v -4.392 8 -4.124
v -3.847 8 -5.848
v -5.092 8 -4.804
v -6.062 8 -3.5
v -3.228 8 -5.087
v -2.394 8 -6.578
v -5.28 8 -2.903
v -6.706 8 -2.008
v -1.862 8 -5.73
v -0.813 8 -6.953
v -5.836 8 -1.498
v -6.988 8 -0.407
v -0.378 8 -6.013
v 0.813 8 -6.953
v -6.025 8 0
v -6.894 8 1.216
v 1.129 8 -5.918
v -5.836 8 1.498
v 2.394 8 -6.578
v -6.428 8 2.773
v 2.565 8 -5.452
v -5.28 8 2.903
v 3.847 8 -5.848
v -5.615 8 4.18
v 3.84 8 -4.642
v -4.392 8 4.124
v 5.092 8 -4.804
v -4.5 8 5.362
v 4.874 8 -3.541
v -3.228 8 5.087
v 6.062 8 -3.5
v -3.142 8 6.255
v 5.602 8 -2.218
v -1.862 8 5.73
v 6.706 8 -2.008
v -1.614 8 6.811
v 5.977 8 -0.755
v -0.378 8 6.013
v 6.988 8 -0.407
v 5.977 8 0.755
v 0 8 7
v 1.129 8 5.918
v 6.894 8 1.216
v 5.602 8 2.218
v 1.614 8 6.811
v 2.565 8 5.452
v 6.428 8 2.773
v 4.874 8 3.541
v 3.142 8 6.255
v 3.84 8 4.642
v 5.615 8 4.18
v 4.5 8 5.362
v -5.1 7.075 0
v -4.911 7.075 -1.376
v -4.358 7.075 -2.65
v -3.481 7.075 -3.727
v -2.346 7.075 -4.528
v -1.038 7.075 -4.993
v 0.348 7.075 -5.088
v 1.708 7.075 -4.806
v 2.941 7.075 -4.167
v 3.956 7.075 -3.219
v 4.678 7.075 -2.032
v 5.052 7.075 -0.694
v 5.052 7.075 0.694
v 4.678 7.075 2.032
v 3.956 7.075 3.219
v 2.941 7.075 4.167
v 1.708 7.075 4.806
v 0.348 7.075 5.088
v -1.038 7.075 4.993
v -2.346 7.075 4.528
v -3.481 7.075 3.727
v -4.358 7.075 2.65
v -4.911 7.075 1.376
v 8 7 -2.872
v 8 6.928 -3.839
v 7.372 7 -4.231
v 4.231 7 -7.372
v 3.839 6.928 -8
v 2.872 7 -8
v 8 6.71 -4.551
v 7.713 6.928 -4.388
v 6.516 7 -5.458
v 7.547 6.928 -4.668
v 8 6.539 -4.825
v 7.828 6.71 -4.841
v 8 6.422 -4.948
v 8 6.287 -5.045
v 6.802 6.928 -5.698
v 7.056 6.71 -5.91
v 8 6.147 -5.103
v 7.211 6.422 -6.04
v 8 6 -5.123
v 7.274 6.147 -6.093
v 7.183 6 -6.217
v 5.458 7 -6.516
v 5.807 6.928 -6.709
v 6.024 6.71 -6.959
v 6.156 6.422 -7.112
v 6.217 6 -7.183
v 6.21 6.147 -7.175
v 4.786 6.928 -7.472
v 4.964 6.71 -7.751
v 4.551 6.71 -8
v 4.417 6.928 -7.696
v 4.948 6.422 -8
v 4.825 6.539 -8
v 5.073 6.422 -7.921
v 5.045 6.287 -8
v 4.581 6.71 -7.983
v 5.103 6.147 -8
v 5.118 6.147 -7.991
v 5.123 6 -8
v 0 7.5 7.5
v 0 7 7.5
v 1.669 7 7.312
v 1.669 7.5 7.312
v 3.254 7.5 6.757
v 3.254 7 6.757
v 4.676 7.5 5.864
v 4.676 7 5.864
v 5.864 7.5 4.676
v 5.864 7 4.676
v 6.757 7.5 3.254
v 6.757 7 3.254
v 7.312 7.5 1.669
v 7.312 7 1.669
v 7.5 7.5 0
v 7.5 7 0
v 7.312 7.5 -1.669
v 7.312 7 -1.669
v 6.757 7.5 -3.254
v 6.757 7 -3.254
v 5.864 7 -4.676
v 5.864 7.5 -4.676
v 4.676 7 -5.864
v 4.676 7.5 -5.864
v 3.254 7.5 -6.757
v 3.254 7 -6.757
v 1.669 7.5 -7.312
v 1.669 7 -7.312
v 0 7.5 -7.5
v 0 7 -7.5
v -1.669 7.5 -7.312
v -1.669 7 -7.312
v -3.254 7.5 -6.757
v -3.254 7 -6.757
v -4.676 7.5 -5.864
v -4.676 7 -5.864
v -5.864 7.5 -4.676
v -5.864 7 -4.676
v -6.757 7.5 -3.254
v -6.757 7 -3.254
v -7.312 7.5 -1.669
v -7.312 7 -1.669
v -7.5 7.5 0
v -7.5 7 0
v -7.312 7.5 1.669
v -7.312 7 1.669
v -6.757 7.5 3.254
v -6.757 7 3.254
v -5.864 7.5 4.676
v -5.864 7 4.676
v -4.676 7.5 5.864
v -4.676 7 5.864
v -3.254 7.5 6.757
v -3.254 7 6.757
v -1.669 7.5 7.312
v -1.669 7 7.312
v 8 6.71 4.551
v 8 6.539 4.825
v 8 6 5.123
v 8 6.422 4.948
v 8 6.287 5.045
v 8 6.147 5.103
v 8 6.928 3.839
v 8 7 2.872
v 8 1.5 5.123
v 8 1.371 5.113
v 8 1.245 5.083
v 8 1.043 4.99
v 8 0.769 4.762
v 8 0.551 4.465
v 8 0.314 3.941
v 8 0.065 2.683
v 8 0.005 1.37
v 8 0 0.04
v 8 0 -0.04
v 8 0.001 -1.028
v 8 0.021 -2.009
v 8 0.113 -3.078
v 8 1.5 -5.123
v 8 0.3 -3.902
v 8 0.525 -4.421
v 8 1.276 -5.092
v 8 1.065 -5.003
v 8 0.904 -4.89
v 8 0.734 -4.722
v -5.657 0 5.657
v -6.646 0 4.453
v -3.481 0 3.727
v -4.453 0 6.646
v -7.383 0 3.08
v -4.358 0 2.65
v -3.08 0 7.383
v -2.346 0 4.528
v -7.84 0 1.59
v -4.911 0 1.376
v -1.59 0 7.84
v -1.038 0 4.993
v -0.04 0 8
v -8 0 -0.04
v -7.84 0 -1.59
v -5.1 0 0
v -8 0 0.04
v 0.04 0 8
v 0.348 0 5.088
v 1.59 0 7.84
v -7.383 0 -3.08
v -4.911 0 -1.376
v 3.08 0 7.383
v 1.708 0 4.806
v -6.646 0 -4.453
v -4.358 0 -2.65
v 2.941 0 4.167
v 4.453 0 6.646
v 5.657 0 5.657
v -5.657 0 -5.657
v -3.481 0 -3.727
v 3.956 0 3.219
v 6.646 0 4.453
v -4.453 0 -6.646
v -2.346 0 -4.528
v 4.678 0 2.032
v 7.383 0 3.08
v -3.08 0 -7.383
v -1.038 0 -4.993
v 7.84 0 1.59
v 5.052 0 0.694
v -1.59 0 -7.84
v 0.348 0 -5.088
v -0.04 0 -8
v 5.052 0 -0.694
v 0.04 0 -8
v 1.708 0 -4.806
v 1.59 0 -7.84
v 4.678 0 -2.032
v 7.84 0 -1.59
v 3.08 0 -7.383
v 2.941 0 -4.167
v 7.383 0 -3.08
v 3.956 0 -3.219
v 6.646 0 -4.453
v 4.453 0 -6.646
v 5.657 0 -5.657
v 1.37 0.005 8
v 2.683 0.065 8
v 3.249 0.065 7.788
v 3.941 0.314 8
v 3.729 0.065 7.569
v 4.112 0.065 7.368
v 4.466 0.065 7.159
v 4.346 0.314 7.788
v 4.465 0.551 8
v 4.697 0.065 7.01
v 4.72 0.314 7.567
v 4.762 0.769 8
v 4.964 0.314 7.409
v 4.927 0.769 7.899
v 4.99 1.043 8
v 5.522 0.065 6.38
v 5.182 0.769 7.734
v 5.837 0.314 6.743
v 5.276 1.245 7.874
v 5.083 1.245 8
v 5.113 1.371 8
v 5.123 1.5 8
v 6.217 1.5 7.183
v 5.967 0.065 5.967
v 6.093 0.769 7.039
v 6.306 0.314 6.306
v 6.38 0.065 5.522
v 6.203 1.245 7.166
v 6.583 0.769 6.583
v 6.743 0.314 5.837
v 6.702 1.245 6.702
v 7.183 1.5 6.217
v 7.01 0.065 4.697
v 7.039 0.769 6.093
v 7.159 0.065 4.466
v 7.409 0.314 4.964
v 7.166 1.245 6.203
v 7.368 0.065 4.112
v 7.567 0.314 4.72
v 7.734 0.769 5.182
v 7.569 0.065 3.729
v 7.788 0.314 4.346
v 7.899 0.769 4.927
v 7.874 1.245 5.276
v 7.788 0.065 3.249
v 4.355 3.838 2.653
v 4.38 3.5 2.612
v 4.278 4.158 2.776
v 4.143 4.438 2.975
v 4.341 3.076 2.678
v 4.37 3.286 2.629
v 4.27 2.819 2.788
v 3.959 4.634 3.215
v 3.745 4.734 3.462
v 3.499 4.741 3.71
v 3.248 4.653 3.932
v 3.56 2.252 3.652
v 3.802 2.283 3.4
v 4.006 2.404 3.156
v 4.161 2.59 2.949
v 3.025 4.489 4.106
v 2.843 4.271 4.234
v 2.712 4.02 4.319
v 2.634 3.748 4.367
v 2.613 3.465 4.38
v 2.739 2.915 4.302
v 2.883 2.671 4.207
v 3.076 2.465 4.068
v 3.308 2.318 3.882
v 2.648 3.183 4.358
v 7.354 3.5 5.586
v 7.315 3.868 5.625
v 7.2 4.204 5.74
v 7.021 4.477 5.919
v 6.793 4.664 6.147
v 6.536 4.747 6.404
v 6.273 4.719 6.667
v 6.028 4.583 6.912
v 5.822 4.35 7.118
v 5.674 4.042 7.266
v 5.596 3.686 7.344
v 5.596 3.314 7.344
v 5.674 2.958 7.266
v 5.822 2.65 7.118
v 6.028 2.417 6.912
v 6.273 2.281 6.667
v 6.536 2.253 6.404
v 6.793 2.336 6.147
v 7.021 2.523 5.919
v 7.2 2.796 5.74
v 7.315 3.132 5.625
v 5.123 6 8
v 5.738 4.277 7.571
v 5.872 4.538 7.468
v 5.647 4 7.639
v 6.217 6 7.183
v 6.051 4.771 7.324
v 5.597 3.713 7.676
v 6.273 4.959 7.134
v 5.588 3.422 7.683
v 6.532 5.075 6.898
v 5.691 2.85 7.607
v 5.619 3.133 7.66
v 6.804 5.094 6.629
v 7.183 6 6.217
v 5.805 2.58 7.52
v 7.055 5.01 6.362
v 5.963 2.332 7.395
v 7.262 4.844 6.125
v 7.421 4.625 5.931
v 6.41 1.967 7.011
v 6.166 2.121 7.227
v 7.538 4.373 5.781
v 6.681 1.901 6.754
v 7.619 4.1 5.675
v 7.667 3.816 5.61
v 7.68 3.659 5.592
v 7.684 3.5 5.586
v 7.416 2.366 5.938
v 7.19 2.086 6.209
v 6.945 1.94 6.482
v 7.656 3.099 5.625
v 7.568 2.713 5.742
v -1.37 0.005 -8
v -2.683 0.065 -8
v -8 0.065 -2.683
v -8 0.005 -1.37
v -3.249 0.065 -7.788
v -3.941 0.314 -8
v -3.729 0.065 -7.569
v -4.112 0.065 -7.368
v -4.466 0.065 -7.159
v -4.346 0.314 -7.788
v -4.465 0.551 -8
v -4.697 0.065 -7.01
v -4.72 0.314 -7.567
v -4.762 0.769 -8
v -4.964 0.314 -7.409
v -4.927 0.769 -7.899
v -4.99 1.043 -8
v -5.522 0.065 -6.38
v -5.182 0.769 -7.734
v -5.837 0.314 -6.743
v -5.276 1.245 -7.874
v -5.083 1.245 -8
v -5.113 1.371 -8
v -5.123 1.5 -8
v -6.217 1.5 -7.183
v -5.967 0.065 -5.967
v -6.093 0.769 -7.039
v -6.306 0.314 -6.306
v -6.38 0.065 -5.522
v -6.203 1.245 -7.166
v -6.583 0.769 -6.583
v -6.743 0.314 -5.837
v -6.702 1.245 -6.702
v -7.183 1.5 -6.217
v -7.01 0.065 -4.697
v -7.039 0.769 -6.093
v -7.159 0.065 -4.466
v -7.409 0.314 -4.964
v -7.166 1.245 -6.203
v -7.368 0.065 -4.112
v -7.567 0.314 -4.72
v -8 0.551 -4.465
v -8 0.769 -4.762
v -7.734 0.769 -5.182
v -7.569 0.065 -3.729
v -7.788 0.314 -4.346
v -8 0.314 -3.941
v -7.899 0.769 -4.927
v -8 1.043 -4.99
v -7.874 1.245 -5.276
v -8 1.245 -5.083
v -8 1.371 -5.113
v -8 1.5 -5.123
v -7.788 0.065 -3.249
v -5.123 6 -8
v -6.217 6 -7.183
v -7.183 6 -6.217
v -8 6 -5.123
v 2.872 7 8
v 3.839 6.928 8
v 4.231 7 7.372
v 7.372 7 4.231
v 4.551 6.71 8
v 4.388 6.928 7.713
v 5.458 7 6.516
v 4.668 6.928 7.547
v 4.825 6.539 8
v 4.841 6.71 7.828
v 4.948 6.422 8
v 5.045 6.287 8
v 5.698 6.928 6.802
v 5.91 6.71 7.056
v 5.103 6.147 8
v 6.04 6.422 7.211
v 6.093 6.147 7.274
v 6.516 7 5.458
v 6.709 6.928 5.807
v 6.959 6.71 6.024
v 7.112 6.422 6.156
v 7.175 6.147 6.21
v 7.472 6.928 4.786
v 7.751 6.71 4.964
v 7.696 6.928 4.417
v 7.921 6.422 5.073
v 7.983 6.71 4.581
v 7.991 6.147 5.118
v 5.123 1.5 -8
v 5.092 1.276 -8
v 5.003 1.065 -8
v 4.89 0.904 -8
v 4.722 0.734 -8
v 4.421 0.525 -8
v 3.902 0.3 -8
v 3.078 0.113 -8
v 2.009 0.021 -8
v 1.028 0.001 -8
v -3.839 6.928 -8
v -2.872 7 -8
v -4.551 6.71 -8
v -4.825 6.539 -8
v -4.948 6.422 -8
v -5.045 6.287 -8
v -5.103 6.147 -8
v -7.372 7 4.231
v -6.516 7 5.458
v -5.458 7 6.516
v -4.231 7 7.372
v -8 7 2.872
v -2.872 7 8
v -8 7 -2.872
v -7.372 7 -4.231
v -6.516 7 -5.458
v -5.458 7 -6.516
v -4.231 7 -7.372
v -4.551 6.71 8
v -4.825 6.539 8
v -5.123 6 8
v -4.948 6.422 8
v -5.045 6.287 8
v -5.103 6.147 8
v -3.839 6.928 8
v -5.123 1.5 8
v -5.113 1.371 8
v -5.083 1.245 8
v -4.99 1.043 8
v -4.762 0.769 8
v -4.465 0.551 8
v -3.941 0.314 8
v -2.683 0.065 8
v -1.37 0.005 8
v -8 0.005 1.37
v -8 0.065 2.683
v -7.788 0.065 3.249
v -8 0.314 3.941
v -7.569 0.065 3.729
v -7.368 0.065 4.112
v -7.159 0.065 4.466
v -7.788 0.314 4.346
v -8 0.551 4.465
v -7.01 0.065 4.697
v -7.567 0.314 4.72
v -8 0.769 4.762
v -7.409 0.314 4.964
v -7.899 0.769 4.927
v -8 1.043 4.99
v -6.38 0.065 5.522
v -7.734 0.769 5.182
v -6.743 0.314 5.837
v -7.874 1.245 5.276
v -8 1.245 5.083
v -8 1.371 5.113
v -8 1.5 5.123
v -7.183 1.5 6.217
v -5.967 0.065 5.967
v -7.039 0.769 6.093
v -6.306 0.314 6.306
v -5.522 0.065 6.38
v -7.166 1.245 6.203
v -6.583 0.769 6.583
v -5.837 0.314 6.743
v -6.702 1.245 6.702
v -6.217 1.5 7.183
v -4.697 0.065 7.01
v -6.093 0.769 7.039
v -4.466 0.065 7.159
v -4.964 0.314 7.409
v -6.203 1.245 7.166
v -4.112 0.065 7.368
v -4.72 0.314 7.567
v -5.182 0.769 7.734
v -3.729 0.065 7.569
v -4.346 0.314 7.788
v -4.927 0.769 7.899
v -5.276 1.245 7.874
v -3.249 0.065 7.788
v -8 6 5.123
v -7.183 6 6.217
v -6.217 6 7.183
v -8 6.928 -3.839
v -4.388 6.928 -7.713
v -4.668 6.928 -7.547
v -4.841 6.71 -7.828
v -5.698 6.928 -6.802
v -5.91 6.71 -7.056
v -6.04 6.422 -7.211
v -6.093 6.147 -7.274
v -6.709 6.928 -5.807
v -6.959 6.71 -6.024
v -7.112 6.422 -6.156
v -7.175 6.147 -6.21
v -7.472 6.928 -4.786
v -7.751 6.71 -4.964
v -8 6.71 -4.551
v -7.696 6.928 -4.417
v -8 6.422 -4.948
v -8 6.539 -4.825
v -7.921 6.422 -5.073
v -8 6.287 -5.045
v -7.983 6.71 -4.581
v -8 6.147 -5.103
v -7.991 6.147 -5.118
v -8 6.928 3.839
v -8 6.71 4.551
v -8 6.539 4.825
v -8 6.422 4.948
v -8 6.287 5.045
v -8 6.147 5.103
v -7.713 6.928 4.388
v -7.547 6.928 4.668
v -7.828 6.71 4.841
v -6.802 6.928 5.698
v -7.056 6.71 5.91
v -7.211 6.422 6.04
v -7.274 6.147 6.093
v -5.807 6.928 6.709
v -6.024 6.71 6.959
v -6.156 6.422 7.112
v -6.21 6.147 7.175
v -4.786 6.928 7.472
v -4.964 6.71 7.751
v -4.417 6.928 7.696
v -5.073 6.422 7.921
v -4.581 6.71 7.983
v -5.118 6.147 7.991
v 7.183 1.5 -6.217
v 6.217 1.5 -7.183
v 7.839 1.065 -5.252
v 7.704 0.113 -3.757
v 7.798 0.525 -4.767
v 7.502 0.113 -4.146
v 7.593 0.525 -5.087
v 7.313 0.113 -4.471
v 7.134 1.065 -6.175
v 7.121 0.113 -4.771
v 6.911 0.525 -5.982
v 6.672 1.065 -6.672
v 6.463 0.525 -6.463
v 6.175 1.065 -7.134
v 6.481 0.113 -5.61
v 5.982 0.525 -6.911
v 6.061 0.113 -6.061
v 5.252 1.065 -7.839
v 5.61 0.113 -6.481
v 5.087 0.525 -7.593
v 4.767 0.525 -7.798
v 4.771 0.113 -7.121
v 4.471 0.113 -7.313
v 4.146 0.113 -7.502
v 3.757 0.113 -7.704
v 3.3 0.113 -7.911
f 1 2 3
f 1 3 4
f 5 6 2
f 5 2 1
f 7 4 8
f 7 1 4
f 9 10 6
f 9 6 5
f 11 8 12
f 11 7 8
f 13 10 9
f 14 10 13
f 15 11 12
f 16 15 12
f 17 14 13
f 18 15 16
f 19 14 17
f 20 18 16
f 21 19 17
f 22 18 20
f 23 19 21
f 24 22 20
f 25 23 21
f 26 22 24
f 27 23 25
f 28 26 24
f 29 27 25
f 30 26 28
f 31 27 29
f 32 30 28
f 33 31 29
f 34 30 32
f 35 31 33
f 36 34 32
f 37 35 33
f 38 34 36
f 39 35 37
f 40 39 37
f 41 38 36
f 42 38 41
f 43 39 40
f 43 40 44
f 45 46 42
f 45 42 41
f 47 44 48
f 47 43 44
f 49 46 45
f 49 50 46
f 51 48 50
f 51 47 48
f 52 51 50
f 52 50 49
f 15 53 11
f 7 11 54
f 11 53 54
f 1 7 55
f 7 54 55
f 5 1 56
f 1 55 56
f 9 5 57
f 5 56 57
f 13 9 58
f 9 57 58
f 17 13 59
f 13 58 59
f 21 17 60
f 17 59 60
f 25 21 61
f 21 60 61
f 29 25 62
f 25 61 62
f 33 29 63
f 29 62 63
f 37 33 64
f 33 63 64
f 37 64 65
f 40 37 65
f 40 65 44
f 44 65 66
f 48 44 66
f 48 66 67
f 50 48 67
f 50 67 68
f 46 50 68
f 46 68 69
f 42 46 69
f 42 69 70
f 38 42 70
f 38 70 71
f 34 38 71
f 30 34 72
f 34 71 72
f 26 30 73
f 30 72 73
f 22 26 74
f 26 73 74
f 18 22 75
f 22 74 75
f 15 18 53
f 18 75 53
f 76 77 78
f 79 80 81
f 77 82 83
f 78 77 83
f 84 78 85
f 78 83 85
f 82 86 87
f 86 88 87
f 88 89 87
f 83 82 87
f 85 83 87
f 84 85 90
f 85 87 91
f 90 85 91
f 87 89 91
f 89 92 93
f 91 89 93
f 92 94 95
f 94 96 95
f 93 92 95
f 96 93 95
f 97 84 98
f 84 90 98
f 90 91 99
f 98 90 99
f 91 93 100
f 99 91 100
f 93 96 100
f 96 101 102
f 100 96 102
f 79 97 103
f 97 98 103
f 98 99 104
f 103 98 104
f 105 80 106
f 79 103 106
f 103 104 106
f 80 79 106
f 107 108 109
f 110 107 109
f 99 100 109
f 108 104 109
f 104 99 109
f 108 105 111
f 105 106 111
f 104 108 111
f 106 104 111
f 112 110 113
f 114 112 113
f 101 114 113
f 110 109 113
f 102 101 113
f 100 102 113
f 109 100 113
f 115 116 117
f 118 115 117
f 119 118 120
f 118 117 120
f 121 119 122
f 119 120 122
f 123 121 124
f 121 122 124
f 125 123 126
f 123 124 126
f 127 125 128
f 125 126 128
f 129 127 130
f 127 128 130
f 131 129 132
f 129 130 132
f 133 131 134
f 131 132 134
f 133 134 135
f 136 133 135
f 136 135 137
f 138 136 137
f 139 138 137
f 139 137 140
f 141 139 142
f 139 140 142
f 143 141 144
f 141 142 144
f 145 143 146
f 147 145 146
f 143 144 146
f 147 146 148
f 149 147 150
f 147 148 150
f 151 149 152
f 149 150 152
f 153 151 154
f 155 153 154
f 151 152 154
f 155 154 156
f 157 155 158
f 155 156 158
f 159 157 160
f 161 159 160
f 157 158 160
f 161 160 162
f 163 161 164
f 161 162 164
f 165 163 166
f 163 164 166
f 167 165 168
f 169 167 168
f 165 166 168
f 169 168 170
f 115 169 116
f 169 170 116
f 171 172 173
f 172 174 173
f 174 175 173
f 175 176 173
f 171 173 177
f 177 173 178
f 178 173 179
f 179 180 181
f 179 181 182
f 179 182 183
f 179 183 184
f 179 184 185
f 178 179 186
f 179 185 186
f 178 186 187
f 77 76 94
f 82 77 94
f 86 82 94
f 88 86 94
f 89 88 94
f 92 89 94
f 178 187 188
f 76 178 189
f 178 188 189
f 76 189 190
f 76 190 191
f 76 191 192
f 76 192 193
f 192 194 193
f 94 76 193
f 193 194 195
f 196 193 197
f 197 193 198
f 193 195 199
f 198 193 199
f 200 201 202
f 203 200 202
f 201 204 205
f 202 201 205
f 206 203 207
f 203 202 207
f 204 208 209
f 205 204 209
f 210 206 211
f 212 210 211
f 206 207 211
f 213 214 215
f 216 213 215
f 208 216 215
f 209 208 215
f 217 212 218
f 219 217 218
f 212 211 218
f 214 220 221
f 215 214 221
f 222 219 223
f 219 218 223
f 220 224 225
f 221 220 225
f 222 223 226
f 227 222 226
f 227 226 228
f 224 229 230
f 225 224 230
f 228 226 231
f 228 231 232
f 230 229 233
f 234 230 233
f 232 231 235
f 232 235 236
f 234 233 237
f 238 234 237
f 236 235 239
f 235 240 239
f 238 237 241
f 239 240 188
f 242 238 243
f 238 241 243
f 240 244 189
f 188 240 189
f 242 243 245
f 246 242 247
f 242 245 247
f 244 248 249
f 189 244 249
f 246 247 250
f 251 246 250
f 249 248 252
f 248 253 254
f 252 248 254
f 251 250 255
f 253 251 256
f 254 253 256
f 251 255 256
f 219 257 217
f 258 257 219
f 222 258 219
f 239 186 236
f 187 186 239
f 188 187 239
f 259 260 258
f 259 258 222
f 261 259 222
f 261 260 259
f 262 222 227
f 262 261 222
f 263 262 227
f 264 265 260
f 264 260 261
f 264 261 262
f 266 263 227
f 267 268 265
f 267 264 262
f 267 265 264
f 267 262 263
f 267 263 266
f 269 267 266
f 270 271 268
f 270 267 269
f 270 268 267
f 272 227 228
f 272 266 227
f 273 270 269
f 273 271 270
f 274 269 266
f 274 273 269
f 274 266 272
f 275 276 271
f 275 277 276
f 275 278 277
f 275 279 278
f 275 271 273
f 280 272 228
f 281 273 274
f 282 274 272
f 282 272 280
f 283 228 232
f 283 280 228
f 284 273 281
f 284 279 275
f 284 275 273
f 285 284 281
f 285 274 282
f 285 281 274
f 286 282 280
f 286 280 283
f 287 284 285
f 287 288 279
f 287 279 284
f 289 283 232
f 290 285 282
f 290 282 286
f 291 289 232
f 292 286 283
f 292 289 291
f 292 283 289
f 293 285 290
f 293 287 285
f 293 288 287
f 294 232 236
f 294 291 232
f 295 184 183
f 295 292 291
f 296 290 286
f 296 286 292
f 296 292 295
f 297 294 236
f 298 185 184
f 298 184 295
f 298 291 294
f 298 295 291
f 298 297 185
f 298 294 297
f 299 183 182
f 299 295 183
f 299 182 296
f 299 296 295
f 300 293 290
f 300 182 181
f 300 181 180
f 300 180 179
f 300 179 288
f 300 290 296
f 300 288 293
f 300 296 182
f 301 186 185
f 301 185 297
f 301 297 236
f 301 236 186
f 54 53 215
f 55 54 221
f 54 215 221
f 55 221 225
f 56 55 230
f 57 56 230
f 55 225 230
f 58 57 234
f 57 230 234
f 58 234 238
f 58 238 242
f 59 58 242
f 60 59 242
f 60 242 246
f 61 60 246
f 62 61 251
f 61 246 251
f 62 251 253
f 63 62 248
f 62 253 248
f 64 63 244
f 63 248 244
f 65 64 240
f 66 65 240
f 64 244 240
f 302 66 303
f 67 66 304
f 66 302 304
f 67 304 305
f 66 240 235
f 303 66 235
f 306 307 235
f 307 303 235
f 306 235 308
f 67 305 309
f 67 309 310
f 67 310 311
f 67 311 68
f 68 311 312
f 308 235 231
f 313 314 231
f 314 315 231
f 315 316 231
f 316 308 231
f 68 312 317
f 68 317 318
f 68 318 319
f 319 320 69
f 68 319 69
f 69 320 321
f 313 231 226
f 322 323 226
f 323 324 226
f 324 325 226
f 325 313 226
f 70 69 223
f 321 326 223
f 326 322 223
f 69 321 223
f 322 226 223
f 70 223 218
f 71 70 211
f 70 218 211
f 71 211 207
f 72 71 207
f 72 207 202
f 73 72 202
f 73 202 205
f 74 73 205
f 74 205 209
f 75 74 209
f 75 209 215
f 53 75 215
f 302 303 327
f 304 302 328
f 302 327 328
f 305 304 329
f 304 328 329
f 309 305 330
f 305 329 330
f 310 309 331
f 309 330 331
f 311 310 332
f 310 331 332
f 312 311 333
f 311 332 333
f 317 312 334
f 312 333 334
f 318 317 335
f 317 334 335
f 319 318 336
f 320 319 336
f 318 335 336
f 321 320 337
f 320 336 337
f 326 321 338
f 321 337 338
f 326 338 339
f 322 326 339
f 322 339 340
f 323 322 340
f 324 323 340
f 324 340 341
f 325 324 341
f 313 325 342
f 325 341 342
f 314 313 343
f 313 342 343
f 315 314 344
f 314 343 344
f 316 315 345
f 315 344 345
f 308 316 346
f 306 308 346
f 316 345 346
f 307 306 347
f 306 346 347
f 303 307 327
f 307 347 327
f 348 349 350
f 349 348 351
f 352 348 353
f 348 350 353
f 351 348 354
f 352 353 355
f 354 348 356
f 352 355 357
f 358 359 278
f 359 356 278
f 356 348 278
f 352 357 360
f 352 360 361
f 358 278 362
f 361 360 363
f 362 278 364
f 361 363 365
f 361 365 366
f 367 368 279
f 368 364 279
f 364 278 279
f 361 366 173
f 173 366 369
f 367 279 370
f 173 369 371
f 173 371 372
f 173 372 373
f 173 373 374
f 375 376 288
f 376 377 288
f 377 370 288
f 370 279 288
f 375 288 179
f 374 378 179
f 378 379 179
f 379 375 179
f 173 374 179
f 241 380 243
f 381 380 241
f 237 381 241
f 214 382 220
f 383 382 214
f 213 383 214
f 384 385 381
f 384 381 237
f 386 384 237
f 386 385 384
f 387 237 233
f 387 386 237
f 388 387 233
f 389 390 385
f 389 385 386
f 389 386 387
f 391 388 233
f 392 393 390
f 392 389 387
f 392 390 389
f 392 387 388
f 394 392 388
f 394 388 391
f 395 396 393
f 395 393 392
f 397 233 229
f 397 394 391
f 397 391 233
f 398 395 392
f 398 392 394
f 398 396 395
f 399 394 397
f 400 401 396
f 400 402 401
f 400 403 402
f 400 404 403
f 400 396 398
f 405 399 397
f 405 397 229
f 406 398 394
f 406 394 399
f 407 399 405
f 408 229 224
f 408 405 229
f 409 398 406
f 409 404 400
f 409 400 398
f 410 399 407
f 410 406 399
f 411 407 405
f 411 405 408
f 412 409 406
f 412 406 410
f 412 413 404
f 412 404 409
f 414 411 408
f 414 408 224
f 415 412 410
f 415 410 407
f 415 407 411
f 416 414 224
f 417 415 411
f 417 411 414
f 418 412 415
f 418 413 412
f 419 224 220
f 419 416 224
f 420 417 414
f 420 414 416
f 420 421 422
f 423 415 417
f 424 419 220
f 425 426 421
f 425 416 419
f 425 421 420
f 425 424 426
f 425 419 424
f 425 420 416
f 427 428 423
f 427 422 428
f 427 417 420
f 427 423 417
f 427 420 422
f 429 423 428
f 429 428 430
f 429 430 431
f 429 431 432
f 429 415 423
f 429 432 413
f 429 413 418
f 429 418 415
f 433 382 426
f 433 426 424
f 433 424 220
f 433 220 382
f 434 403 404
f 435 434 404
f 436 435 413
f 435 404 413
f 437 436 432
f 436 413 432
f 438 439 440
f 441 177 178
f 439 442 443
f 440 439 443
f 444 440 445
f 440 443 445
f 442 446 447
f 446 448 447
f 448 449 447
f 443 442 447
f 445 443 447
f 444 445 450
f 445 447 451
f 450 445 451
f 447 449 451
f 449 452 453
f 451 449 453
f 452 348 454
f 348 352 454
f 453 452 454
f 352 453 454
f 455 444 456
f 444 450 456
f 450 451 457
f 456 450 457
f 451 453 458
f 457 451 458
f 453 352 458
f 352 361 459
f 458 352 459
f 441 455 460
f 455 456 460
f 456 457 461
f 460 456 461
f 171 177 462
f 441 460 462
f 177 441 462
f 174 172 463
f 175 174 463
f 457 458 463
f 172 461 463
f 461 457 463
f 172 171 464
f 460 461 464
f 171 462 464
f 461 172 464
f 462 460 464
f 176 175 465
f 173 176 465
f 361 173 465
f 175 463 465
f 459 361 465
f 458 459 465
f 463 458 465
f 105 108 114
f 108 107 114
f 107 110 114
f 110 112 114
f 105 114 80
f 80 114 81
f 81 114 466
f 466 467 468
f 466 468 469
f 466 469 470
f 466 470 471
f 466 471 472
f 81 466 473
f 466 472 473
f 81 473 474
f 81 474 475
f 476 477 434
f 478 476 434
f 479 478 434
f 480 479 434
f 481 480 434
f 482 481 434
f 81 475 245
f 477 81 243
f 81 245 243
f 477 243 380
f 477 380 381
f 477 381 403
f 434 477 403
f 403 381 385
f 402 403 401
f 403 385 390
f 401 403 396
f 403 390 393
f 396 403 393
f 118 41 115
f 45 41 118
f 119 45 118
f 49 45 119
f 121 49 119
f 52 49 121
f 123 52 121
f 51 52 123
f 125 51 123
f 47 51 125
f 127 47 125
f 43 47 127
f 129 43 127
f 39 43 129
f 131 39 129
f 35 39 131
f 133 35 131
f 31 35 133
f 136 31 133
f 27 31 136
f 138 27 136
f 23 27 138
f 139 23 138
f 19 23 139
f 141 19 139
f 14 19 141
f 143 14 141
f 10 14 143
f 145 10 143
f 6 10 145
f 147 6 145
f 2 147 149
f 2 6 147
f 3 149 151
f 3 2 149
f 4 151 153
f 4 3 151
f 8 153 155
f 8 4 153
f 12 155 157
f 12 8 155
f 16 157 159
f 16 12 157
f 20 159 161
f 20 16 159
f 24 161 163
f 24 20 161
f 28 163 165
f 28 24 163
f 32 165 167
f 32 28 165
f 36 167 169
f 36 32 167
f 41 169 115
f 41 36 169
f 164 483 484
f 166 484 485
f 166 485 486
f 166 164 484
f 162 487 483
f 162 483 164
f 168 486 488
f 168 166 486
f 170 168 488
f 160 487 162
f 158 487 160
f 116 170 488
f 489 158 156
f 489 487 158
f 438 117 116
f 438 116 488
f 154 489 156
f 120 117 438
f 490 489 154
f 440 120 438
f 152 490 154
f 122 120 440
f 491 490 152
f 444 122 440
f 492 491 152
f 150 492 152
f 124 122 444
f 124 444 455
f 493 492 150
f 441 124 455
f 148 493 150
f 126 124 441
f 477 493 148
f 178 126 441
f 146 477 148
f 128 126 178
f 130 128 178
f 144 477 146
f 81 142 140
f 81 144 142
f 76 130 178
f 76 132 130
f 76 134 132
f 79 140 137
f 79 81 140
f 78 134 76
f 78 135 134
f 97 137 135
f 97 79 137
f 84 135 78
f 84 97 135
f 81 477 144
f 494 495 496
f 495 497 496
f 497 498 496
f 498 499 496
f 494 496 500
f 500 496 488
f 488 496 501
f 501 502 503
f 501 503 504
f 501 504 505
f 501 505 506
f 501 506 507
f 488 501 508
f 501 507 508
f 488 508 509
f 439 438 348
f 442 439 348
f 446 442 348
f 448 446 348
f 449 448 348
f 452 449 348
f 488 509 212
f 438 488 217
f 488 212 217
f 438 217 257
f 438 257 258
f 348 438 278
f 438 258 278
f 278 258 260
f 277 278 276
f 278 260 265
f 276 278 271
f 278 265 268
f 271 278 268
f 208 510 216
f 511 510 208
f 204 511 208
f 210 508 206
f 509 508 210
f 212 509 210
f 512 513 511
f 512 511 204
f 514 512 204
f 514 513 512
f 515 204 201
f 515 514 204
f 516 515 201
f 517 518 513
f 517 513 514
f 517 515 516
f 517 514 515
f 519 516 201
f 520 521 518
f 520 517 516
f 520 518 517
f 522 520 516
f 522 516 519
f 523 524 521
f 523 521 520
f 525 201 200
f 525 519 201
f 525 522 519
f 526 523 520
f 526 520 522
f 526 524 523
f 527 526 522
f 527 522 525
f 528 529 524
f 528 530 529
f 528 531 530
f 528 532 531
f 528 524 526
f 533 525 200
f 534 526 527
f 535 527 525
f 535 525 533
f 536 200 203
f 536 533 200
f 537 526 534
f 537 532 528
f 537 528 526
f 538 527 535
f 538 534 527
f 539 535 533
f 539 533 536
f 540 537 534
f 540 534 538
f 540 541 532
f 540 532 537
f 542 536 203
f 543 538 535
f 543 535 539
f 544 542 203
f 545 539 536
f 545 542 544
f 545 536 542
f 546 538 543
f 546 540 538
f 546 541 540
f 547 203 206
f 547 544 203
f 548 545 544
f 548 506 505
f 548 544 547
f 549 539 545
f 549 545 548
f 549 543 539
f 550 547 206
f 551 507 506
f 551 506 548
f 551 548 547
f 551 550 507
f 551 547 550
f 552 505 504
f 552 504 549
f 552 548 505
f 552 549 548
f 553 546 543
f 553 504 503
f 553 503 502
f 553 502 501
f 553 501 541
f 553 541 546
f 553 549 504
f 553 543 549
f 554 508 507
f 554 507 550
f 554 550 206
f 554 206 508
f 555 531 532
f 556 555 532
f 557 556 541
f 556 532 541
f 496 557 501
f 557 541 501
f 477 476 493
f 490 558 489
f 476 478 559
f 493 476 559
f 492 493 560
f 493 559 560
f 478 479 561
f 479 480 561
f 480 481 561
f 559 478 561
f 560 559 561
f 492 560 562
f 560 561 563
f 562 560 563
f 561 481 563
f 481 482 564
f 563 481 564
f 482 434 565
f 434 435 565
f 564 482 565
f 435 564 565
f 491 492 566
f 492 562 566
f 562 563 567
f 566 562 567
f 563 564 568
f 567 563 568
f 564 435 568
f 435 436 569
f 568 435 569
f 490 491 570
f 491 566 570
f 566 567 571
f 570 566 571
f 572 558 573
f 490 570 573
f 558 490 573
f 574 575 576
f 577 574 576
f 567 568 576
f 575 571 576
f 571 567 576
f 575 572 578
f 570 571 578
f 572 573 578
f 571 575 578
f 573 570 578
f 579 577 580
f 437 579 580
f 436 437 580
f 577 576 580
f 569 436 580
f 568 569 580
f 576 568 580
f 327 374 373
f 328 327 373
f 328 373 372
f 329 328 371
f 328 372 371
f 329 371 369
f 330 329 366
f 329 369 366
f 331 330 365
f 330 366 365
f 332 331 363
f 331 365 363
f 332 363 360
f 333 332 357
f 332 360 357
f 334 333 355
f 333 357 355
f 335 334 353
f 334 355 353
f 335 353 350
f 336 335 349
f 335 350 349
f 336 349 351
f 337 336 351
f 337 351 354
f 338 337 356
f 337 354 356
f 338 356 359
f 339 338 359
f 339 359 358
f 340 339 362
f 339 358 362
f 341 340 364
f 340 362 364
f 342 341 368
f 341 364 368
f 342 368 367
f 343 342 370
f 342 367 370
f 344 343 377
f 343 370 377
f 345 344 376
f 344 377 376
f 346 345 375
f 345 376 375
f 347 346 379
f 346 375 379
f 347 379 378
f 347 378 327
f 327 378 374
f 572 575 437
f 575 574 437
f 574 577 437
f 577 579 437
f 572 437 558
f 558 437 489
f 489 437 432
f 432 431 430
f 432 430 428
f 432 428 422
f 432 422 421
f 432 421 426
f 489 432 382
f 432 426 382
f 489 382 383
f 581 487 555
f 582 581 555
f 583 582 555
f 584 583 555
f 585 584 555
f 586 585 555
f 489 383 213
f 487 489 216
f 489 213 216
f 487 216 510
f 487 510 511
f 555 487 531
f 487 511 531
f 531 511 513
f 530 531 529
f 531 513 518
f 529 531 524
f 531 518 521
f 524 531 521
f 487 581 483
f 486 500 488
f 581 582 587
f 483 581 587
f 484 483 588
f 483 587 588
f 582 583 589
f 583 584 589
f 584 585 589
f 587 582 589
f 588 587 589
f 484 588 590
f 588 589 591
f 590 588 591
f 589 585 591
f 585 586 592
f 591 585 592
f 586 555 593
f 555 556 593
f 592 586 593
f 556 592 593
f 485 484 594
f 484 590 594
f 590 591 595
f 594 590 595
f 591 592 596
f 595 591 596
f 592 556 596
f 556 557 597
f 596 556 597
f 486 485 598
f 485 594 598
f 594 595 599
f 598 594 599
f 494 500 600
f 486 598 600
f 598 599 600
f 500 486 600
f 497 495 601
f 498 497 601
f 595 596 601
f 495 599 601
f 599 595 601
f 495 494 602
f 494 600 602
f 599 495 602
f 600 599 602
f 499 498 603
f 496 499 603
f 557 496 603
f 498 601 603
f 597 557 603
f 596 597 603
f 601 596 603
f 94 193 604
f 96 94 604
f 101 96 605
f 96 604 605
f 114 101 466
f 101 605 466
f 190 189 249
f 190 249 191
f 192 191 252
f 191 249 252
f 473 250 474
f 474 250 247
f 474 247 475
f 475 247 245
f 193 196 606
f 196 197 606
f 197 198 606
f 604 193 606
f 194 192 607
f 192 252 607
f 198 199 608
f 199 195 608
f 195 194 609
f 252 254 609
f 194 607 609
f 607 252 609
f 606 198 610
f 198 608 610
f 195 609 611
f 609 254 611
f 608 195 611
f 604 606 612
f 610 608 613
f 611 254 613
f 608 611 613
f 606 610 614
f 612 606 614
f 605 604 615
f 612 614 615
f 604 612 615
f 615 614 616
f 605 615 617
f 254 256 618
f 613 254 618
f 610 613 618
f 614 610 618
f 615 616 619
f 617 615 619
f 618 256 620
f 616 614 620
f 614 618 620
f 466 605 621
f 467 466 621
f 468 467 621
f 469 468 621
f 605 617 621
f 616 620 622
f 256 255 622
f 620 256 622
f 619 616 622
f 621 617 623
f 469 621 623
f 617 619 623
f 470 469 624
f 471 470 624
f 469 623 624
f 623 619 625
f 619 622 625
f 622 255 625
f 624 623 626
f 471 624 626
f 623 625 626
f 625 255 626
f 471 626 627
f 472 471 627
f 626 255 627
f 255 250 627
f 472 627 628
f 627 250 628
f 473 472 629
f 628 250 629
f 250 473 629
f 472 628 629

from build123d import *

# Parameters (mm, degrees)
RESSALTO_EXTRUS_O1_DEPTH         = 7
ESBO_O2_R                        = 7.5
RESSALTO_EXTRUS_O2_DEPTH         = 1
FURO_ROSCADO_DE_M121_D           = 10.2
FURO_ROSCADO_DE_M121_CSINK_D     = 12.05
FURO_ROSCADO_DE_M121_CSINK_ANGLE = 90
FILETE1_R                        = 1
FILETE2_R                        = 1.5
CHANFRO1_SIZE                    = 0.5


# Read off the part's stored shape, not the designer's step: Furo roscado de M32
with BuildPart() as part:
    # Esboço1 → Ressalto-extrusão1 (new body)
    with BuildSketch(Plane(origin=(0, 0, 0), x_dir=(1, 0, 0), z_dir=(0, 1, 0))):
        with BuildLine():
            Line((5.123475383, 8), (-5.123475383, 8))
            ThreePointArc((-5.123475383, 8), (-6.717514421, 6.717514421), (-8, 5.123475383))
            Line((-8, 5.123475383), (-8, -5.123475383))
            ThreePointArc((-8, -5.123475383), (-6.717514421, -6.717514421), (-5.123475383, -8))
            Line((-5.123475383, -8), (5.123475383, -8))
            ThreePointArc((5.123475383, -8), (6.717514421, -6.717514421), (8, -5.123475383))
            Line((8, -5.123475383), (8, 5.123475383))
            ThreePointArc((8, 5.123475383), (6.717514421, 6.717514421), (5.123475383, 8))
        make_face()
    extrude(amount=RESSALTO_EXTRUS_O1_DEPTH)

    # Esboço2 → Ressalto-extrusão2 (add)
    with BuildSketch(Plane(origin=(0, 7, 0), x_dir=(1, 0, 0), z_dir=(0, 1, 0))):
        with Locations(Location((0, 0, 0), (0, 0, 270))):
            Circle(ESBO_O2_R)
    extrude(amount=RESSALTO_EXTRUS_O2_DEPTH)

    # Furo roscado de M121 (through all)
    with Locations(Plane(origin=(0, 8, 0), x_dir=(1, 0, 0), z_dir=(0, 1, 0))):
        with Locations((0, 0)):
            CounterSinkHole(FURO_ROSCADO_DE_M121_D / 2, FURO_ROSCADO_DE_M121_CSINK_D / 2, counter_sink_angle=FURO_ROSCADO_DE_M121_CSINK_ANGLE)

    # Filete1
    filete1_edges = [part.edges().sort_by_distance(p)[0] for p in [
        (6.717514421, 7, 6.717514421),
        (6.717514421, 7, -6.717514421),
        (-6.717514421, 7, -6.717514421),
        (-6.717514421, 7, 6.717514421),
    ]]
    fillet(filete1_edges, radius=FILETE1_R)

    # Filete2
    filete2_edges = [part.edges().sort_by_distance(p)[0] for p in [
        (6.717514421, 0, -6.717514421),
        (-6.717514421, 0, -6.717514421),
        (-6.717514421, 0, 6.717514421),
        (6.717514421, 0, 6.717514421),
    ]]
    fillet(filete2_edges, radius=FILETE2_R - 0.0001)  # a hair under: the kernel refuses the full size

    # Chanfro1
    chanfro1_edges = [part.edges().sort_by_distance(p)[0] for p in [
        (0, 8, -7.5),
    ]]
    chamfer(chanfro1_edges, length=CHANFRO1_SIZE)

    # Furo roscado de M32 outline → Furo roscado de M32 (revolve, cut)
    with BuildSketch(Plane(origin=(0, 3.5, 0), x_dir=(0.707106781186546, 0, -0.707106781186549), z_dir=(0, -1, 0))):
        Polygon((1.600067365, 9.500067365), (0, 9.500067365), (0, 4.944353867), (1.25, 4.944353867), (1.25, 9.15), align=None)
    revolve(axis=Axis((0, 3.5, 0), (0.707106781186549, 0, 0.707106781186546)), mode=Mode.SUBTRACT)


solid = part.part
